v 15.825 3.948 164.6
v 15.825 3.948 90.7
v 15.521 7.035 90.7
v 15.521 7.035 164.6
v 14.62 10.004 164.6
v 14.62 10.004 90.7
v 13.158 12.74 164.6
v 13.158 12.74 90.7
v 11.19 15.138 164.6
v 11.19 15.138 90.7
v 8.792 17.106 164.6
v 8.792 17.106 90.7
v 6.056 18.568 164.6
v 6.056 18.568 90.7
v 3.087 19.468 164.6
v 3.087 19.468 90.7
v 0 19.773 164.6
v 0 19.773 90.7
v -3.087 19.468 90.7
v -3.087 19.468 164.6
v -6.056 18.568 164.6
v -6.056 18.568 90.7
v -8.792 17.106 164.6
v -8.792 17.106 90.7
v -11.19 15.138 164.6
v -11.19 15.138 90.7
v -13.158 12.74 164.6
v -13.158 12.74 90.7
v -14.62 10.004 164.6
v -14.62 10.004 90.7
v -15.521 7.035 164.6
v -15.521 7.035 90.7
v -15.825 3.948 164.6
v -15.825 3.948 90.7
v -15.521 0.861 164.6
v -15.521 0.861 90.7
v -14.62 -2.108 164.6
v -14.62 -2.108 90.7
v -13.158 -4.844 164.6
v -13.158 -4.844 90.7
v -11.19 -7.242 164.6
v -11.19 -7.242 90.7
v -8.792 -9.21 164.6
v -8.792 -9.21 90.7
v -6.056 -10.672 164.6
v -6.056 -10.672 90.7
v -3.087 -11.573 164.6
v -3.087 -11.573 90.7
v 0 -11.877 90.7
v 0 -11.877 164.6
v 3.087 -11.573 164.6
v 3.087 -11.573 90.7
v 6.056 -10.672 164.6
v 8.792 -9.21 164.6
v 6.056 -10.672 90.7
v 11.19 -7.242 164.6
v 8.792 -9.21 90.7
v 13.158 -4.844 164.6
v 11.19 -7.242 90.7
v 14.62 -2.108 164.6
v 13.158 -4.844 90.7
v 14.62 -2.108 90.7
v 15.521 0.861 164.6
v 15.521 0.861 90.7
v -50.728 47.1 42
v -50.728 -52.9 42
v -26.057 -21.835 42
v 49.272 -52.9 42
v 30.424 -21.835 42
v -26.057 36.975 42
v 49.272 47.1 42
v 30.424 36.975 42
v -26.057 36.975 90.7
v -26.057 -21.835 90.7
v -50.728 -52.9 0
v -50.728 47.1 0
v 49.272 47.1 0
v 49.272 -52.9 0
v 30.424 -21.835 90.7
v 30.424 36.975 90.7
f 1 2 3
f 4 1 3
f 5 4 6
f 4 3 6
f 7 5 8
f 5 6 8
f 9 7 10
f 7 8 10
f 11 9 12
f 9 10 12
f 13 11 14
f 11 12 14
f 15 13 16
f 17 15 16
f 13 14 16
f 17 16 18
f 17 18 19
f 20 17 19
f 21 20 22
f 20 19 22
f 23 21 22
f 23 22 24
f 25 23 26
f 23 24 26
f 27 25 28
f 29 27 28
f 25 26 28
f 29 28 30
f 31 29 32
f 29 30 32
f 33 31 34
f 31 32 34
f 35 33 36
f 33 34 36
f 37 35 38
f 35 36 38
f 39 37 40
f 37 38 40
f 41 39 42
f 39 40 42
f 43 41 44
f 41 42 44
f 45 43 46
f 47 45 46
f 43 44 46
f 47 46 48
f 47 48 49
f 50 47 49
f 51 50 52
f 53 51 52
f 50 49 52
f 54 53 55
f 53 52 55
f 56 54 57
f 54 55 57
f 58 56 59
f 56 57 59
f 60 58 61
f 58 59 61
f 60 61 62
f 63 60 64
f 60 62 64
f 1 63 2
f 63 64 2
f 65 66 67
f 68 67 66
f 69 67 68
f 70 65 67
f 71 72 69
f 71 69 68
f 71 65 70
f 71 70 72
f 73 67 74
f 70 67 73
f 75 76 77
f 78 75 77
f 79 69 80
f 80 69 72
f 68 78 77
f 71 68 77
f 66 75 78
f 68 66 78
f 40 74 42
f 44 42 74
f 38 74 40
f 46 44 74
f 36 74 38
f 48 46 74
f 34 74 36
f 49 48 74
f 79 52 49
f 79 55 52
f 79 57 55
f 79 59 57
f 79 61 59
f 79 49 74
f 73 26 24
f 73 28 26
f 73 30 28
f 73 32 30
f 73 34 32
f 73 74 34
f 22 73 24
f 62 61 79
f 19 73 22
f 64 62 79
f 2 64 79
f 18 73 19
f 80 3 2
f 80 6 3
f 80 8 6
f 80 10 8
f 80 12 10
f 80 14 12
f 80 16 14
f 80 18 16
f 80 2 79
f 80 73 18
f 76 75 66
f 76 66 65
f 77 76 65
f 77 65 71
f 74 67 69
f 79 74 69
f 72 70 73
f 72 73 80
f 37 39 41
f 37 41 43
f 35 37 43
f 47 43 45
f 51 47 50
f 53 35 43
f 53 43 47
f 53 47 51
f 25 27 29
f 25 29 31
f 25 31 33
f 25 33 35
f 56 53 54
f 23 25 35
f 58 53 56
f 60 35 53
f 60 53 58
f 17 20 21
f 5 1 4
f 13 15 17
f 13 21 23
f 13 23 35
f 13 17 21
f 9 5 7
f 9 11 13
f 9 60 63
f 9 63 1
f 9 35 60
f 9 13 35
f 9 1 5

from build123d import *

# Parameters (mm, degrees)
F0_W     = 100
F0_H     = 100
F1_DEPTH = 42
F2_W     = 56.480739
F2_H     = 58.809845
F3_DEPTH = 48.7
F4_R     = 15.824567
F5_DEPTH = 73.9
F6_DEPTH = 25


with BuildPart() as f1:
    # F0 (on Top) → F1 (new body)
    with BuildSketch(Plane.XY):
        with Locations((-0.727845, -2.89979)):
            Rectangle(F0_W, F0_H)
    extrude(amount=F1_DEPTH)

    # F2 (on face) → F3 (join)
    with BuildSketch(Plane.XY.offset(42)):
        with Locations((2.183533, 7.569583)):
            Rectangle(F2_W, F2_H)
    extrude(amount=F3_DEPTH)

    # F4 (on face) → F5 (join)
    with BuildSketch(Plane.XY.offset(90.7)):
        with Locations((0, 3.947993)):
            Circle(F4_R)
    extrude(amount=F5_DEPTH)

    # F0 (on Top) → F6 (join)
    with BuildSketch(Plane.XY):
        with Locations((-0.727845, -2.89979)):
            Rectangle(F0_W, F0_H)
    extrude(amount=F6_DEPTH)


solid = f1.part
